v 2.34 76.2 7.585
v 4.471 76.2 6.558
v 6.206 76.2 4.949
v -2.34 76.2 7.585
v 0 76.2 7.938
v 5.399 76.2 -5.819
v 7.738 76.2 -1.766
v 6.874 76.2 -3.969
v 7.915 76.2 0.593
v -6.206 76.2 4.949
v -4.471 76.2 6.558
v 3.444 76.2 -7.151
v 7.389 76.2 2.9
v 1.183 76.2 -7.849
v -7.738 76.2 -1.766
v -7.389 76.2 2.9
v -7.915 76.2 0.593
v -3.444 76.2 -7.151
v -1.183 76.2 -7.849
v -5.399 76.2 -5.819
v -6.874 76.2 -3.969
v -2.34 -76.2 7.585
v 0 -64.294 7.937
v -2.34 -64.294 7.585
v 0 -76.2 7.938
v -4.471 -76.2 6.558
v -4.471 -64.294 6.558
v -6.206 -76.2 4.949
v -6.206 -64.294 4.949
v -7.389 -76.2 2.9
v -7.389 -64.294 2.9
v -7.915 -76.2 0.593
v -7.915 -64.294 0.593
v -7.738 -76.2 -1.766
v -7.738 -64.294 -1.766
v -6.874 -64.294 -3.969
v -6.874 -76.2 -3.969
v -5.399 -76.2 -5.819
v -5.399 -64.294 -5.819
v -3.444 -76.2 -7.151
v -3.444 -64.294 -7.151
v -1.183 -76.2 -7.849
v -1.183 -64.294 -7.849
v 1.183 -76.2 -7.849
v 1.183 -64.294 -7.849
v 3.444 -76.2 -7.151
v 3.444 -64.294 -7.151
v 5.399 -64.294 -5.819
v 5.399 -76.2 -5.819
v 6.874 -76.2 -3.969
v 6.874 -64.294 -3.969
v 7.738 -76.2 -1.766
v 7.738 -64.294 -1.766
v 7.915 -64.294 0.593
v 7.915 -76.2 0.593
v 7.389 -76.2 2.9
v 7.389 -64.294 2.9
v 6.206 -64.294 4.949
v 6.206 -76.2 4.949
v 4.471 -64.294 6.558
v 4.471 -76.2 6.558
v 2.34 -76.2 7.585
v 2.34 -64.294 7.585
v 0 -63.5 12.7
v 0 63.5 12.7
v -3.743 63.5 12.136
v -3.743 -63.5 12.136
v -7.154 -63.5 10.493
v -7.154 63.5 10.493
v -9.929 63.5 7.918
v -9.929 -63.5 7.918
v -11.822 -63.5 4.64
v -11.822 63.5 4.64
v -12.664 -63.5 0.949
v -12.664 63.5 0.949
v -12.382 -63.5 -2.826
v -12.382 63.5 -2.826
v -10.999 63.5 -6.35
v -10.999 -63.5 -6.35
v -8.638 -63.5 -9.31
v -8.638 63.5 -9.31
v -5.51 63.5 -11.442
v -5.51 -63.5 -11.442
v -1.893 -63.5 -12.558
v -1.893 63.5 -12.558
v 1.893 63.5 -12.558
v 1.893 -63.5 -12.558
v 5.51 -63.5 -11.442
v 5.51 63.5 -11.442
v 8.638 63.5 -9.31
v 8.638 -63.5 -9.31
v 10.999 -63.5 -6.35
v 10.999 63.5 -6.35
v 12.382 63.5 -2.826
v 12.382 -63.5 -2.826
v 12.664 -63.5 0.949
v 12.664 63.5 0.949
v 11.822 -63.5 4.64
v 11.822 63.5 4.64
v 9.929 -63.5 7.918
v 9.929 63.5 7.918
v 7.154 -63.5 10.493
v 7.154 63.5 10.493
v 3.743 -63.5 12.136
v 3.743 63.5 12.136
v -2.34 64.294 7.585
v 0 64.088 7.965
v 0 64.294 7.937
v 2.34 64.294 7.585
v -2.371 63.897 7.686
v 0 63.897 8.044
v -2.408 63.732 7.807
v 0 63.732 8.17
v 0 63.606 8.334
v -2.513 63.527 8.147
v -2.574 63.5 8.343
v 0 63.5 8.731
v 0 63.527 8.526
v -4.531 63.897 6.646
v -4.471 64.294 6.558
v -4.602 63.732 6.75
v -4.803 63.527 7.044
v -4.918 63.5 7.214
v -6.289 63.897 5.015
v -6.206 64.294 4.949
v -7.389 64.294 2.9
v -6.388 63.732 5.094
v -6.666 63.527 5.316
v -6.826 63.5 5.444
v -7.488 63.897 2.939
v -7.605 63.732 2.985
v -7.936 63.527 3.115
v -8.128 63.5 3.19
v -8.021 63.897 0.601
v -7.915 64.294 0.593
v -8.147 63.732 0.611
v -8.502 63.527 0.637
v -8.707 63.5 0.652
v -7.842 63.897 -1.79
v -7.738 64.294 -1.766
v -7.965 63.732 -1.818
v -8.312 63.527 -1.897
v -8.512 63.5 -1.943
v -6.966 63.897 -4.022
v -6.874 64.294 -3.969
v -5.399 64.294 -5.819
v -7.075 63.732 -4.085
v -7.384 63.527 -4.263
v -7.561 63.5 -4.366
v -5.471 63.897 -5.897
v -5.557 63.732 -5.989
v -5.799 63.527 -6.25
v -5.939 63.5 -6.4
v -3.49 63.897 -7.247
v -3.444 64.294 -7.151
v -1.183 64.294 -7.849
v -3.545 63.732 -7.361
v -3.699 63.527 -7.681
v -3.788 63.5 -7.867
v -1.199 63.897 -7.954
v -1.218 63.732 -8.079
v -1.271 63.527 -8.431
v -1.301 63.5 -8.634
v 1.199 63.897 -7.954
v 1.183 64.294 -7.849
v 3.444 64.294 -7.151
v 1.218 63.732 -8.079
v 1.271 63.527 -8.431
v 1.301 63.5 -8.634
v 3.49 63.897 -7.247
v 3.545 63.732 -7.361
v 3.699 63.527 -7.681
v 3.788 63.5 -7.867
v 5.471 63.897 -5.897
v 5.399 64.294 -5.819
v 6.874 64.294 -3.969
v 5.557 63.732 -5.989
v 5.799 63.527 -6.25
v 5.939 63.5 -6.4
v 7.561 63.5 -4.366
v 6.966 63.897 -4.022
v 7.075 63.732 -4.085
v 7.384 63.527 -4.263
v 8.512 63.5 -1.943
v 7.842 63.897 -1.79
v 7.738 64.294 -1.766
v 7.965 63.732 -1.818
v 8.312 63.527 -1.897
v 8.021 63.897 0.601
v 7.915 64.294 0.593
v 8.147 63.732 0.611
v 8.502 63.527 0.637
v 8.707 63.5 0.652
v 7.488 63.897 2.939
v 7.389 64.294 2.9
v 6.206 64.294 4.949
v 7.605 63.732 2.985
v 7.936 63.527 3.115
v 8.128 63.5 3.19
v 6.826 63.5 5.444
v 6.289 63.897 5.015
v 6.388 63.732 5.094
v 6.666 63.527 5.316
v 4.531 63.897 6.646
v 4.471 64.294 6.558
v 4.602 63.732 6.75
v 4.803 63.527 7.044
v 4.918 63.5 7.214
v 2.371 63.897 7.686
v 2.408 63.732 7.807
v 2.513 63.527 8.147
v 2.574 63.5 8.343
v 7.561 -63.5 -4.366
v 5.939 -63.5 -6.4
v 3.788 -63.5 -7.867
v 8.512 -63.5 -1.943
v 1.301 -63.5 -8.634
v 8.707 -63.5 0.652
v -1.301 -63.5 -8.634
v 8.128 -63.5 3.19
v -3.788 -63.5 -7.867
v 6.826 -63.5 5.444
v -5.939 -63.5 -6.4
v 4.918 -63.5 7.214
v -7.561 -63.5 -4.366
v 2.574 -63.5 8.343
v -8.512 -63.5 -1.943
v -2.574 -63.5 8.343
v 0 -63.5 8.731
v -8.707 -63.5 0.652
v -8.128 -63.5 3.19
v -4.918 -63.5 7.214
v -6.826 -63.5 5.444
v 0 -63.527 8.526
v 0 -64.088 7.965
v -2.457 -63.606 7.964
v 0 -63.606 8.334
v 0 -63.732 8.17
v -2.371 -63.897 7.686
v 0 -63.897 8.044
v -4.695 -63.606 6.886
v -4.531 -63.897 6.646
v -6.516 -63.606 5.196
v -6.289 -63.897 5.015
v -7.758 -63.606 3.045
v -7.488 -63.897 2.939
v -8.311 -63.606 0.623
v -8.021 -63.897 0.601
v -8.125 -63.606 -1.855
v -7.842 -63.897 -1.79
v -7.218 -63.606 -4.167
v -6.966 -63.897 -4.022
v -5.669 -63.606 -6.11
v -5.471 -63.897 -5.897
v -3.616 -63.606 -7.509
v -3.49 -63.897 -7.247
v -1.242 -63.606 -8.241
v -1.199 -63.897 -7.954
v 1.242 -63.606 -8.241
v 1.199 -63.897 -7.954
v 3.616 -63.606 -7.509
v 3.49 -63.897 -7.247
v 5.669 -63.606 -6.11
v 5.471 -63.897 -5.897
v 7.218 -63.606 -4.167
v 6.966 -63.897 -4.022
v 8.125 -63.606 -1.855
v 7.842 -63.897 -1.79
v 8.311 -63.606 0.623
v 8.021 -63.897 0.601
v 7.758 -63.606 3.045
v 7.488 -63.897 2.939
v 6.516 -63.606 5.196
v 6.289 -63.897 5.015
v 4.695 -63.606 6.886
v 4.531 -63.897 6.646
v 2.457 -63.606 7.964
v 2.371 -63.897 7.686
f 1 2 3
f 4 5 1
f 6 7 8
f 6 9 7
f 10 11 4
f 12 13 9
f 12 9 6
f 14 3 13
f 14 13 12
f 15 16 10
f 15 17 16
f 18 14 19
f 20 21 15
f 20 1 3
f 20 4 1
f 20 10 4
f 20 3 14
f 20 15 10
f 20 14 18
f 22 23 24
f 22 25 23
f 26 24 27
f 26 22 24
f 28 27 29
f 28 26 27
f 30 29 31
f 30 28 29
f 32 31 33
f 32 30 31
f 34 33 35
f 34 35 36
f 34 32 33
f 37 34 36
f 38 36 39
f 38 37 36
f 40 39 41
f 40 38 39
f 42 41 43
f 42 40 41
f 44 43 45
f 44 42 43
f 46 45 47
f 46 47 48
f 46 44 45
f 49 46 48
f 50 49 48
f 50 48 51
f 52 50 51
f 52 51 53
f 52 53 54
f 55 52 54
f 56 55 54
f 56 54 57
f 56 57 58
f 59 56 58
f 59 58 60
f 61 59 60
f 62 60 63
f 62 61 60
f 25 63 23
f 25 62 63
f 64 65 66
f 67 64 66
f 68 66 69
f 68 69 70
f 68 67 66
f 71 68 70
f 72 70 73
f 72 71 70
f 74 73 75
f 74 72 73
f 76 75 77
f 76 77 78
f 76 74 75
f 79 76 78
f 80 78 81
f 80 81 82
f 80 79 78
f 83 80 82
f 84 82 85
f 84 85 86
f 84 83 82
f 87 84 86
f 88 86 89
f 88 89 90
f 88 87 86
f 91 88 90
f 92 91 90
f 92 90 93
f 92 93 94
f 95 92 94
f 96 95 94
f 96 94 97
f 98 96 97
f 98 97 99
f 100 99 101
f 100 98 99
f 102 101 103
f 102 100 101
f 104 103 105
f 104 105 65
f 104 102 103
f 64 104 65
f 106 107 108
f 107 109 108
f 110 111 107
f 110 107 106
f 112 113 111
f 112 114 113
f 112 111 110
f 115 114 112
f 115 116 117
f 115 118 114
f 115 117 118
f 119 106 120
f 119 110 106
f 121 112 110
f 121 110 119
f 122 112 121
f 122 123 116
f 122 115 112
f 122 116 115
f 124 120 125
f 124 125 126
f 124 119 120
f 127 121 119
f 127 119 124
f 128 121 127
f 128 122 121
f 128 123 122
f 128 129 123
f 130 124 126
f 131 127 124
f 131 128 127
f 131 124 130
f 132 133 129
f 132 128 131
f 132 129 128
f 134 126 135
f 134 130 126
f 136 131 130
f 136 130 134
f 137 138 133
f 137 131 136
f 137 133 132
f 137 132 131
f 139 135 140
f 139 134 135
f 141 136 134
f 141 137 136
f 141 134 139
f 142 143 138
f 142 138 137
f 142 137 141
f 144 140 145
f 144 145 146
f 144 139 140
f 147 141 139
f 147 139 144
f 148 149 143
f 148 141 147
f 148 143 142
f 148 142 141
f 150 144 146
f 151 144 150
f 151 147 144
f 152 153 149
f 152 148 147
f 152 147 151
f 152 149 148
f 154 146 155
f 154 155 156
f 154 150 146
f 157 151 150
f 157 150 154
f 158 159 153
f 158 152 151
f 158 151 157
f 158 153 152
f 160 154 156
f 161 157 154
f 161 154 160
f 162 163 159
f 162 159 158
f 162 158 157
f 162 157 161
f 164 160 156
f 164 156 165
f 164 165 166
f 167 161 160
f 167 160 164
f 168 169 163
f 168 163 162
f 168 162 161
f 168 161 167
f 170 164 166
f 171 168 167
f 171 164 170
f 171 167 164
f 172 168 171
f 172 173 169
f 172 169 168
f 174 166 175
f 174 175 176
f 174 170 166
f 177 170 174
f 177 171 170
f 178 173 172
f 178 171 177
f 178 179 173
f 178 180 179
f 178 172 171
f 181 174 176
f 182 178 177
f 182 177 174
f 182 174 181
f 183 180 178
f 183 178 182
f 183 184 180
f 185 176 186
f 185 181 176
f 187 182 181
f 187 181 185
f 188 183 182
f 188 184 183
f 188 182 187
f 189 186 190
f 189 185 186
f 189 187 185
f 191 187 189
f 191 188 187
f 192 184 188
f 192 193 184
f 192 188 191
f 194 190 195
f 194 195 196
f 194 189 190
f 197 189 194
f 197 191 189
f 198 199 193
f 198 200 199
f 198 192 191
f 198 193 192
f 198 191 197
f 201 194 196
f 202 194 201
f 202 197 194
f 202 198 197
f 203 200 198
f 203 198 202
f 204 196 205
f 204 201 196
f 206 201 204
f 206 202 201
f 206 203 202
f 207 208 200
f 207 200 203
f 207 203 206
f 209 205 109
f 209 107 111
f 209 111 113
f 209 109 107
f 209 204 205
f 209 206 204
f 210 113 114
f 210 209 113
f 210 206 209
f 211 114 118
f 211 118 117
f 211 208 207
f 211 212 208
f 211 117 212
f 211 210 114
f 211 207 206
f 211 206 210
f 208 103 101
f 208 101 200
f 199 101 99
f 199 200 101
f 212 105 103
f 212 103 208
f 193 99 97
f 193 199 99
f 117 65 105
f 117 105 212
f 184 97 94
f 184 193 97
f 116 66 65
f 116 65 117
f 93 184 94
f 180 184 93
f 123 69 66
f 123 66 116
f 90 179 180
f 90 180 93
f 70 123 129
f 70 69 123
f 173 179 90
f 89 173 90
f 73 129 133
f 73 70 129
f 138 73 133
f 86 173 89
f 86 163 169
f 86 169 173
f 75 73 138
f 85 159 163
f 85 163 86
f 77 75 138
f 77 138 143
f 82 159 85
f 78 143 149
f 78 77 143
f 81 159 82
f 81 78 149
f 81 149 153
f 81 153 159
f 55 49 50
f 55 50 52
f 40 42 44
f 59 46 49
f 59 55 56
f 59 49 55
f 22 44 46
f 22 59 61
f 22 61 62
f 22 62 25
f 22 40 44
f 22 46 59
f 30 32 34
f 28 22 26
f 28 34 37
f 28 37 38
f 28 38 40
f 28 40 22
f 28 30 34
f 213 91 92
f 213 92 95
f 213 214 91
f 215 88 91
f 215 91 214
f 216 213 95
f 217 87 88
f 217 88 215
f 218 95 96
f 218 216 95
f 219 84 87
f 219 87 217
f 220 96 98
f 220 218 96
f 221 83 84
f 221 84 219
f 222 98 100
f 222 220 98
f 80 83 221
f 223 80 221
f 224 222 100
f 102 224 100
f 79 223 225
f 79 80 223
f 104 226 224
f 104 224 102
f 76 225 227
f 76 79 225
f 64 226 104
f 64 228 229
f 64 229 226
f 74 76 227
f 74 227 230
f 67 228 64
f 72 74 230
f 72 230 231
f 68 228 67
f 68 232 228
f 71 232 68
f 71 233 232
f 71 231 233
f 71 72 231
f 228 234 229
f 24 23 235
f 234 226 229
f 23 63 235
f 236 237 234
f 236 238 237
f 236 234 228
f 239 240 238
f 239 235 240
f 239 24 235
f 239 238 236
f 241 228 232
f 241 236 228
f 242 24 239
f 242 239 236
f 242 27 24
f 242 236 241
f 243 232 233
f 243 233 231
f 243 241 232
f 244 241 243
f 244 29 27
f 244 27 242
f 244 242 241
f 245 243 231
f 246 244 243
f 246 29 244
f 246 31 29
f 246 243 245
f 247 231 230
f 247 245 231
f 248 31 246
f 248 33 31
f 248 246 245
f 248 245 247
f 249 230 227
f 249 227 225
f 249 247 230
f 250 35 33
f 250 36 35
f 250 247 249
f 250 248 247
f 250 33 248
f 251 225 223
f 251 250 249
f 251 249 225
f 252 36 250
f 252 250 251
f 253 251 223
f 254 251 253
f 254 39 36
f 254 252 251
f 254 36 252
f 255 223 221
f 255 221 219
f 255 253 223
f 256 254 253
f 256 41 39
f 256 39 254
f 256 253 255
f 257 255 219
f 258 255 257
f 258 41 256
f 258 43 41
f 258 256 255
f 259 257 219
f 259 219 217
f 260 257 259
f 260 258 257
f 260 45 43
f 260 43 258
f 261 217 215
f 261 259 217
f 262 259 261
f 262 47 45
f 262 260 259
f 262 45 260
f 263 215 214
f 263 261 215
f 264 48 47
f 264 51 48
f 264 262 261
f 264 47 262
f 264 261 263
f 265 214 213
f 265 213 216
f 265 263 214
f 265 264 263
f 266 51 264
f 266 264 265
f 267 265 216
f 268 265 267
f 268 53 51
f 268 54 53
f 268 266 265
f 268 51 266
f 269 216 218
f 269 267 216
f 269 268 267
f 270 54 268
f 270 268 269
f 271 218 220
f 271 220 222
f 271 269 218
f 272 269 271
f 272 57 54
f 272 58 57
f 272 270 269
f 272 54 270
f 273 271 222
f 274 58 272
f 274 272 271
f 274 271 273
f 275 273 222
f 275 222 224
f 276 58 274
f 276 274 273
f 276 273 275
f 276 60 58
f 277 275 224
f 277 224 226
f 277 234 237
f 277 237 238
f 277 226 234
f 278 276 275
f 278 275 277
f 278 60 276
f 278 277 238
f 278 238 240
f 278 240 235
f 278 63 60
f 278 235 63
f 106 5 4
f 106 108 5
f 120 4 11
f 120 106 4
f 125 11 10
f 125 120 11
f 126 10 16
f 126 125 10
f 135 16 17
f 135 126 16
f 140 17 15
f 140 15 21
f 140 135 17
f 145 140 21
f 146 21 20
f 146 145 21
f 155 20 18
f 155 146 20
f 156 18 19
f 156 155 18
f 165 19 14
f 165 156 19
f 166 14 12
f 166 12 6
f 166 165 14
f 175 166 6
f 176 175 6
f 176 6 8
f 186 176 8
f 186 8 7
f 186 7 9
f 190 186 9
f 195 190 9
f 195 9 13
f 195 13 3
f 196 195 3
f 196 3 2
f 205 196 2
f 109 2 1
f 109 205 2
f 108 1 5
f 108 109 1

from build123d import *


with BuildPart() as part:
    # Sketch1 → Revolve1 (revolve)
    with BuildSketch(Plane.XY, mode=Mode.PRIVATE) as revolve1_sk:
        with BuildLine():
            Line((0, 76.2), (-7.9375, 76.2))
            Line((-7.9375, 76.2), (-7.9375, 64.29375))
            ThreePointArc((-7.9375, 64.29375), (-8.169983992, 63.732483992), (-8.73125, 63.5))
            Line((-8.73125, 63.5), (-12.7, 63.5))
            Line((-12.7, 63.5), (-12.7, -63.5))
            Line((-12.7, -63.5), (-8.73125, -63.5))
            ThreePointArc((-8.73125, -63.5), (-8.169983992, -63.732483992), (-7.9375, -64.29375))
            Line((-7.9375, -64.29375), (-7.9375, -76.2))
            Line((-7.9375, -76.2), (0, -76.2))
            Line((0, -76.2), (0, 76.2))
        make_face()
    revolve(revolve1_sk.sketch.rotate(Axis((0, 76.2, 0), (0, -1, 0)), 270), axis=Axis((0, 76.2, 0), (0, -1, 0)))


solid = part.part
